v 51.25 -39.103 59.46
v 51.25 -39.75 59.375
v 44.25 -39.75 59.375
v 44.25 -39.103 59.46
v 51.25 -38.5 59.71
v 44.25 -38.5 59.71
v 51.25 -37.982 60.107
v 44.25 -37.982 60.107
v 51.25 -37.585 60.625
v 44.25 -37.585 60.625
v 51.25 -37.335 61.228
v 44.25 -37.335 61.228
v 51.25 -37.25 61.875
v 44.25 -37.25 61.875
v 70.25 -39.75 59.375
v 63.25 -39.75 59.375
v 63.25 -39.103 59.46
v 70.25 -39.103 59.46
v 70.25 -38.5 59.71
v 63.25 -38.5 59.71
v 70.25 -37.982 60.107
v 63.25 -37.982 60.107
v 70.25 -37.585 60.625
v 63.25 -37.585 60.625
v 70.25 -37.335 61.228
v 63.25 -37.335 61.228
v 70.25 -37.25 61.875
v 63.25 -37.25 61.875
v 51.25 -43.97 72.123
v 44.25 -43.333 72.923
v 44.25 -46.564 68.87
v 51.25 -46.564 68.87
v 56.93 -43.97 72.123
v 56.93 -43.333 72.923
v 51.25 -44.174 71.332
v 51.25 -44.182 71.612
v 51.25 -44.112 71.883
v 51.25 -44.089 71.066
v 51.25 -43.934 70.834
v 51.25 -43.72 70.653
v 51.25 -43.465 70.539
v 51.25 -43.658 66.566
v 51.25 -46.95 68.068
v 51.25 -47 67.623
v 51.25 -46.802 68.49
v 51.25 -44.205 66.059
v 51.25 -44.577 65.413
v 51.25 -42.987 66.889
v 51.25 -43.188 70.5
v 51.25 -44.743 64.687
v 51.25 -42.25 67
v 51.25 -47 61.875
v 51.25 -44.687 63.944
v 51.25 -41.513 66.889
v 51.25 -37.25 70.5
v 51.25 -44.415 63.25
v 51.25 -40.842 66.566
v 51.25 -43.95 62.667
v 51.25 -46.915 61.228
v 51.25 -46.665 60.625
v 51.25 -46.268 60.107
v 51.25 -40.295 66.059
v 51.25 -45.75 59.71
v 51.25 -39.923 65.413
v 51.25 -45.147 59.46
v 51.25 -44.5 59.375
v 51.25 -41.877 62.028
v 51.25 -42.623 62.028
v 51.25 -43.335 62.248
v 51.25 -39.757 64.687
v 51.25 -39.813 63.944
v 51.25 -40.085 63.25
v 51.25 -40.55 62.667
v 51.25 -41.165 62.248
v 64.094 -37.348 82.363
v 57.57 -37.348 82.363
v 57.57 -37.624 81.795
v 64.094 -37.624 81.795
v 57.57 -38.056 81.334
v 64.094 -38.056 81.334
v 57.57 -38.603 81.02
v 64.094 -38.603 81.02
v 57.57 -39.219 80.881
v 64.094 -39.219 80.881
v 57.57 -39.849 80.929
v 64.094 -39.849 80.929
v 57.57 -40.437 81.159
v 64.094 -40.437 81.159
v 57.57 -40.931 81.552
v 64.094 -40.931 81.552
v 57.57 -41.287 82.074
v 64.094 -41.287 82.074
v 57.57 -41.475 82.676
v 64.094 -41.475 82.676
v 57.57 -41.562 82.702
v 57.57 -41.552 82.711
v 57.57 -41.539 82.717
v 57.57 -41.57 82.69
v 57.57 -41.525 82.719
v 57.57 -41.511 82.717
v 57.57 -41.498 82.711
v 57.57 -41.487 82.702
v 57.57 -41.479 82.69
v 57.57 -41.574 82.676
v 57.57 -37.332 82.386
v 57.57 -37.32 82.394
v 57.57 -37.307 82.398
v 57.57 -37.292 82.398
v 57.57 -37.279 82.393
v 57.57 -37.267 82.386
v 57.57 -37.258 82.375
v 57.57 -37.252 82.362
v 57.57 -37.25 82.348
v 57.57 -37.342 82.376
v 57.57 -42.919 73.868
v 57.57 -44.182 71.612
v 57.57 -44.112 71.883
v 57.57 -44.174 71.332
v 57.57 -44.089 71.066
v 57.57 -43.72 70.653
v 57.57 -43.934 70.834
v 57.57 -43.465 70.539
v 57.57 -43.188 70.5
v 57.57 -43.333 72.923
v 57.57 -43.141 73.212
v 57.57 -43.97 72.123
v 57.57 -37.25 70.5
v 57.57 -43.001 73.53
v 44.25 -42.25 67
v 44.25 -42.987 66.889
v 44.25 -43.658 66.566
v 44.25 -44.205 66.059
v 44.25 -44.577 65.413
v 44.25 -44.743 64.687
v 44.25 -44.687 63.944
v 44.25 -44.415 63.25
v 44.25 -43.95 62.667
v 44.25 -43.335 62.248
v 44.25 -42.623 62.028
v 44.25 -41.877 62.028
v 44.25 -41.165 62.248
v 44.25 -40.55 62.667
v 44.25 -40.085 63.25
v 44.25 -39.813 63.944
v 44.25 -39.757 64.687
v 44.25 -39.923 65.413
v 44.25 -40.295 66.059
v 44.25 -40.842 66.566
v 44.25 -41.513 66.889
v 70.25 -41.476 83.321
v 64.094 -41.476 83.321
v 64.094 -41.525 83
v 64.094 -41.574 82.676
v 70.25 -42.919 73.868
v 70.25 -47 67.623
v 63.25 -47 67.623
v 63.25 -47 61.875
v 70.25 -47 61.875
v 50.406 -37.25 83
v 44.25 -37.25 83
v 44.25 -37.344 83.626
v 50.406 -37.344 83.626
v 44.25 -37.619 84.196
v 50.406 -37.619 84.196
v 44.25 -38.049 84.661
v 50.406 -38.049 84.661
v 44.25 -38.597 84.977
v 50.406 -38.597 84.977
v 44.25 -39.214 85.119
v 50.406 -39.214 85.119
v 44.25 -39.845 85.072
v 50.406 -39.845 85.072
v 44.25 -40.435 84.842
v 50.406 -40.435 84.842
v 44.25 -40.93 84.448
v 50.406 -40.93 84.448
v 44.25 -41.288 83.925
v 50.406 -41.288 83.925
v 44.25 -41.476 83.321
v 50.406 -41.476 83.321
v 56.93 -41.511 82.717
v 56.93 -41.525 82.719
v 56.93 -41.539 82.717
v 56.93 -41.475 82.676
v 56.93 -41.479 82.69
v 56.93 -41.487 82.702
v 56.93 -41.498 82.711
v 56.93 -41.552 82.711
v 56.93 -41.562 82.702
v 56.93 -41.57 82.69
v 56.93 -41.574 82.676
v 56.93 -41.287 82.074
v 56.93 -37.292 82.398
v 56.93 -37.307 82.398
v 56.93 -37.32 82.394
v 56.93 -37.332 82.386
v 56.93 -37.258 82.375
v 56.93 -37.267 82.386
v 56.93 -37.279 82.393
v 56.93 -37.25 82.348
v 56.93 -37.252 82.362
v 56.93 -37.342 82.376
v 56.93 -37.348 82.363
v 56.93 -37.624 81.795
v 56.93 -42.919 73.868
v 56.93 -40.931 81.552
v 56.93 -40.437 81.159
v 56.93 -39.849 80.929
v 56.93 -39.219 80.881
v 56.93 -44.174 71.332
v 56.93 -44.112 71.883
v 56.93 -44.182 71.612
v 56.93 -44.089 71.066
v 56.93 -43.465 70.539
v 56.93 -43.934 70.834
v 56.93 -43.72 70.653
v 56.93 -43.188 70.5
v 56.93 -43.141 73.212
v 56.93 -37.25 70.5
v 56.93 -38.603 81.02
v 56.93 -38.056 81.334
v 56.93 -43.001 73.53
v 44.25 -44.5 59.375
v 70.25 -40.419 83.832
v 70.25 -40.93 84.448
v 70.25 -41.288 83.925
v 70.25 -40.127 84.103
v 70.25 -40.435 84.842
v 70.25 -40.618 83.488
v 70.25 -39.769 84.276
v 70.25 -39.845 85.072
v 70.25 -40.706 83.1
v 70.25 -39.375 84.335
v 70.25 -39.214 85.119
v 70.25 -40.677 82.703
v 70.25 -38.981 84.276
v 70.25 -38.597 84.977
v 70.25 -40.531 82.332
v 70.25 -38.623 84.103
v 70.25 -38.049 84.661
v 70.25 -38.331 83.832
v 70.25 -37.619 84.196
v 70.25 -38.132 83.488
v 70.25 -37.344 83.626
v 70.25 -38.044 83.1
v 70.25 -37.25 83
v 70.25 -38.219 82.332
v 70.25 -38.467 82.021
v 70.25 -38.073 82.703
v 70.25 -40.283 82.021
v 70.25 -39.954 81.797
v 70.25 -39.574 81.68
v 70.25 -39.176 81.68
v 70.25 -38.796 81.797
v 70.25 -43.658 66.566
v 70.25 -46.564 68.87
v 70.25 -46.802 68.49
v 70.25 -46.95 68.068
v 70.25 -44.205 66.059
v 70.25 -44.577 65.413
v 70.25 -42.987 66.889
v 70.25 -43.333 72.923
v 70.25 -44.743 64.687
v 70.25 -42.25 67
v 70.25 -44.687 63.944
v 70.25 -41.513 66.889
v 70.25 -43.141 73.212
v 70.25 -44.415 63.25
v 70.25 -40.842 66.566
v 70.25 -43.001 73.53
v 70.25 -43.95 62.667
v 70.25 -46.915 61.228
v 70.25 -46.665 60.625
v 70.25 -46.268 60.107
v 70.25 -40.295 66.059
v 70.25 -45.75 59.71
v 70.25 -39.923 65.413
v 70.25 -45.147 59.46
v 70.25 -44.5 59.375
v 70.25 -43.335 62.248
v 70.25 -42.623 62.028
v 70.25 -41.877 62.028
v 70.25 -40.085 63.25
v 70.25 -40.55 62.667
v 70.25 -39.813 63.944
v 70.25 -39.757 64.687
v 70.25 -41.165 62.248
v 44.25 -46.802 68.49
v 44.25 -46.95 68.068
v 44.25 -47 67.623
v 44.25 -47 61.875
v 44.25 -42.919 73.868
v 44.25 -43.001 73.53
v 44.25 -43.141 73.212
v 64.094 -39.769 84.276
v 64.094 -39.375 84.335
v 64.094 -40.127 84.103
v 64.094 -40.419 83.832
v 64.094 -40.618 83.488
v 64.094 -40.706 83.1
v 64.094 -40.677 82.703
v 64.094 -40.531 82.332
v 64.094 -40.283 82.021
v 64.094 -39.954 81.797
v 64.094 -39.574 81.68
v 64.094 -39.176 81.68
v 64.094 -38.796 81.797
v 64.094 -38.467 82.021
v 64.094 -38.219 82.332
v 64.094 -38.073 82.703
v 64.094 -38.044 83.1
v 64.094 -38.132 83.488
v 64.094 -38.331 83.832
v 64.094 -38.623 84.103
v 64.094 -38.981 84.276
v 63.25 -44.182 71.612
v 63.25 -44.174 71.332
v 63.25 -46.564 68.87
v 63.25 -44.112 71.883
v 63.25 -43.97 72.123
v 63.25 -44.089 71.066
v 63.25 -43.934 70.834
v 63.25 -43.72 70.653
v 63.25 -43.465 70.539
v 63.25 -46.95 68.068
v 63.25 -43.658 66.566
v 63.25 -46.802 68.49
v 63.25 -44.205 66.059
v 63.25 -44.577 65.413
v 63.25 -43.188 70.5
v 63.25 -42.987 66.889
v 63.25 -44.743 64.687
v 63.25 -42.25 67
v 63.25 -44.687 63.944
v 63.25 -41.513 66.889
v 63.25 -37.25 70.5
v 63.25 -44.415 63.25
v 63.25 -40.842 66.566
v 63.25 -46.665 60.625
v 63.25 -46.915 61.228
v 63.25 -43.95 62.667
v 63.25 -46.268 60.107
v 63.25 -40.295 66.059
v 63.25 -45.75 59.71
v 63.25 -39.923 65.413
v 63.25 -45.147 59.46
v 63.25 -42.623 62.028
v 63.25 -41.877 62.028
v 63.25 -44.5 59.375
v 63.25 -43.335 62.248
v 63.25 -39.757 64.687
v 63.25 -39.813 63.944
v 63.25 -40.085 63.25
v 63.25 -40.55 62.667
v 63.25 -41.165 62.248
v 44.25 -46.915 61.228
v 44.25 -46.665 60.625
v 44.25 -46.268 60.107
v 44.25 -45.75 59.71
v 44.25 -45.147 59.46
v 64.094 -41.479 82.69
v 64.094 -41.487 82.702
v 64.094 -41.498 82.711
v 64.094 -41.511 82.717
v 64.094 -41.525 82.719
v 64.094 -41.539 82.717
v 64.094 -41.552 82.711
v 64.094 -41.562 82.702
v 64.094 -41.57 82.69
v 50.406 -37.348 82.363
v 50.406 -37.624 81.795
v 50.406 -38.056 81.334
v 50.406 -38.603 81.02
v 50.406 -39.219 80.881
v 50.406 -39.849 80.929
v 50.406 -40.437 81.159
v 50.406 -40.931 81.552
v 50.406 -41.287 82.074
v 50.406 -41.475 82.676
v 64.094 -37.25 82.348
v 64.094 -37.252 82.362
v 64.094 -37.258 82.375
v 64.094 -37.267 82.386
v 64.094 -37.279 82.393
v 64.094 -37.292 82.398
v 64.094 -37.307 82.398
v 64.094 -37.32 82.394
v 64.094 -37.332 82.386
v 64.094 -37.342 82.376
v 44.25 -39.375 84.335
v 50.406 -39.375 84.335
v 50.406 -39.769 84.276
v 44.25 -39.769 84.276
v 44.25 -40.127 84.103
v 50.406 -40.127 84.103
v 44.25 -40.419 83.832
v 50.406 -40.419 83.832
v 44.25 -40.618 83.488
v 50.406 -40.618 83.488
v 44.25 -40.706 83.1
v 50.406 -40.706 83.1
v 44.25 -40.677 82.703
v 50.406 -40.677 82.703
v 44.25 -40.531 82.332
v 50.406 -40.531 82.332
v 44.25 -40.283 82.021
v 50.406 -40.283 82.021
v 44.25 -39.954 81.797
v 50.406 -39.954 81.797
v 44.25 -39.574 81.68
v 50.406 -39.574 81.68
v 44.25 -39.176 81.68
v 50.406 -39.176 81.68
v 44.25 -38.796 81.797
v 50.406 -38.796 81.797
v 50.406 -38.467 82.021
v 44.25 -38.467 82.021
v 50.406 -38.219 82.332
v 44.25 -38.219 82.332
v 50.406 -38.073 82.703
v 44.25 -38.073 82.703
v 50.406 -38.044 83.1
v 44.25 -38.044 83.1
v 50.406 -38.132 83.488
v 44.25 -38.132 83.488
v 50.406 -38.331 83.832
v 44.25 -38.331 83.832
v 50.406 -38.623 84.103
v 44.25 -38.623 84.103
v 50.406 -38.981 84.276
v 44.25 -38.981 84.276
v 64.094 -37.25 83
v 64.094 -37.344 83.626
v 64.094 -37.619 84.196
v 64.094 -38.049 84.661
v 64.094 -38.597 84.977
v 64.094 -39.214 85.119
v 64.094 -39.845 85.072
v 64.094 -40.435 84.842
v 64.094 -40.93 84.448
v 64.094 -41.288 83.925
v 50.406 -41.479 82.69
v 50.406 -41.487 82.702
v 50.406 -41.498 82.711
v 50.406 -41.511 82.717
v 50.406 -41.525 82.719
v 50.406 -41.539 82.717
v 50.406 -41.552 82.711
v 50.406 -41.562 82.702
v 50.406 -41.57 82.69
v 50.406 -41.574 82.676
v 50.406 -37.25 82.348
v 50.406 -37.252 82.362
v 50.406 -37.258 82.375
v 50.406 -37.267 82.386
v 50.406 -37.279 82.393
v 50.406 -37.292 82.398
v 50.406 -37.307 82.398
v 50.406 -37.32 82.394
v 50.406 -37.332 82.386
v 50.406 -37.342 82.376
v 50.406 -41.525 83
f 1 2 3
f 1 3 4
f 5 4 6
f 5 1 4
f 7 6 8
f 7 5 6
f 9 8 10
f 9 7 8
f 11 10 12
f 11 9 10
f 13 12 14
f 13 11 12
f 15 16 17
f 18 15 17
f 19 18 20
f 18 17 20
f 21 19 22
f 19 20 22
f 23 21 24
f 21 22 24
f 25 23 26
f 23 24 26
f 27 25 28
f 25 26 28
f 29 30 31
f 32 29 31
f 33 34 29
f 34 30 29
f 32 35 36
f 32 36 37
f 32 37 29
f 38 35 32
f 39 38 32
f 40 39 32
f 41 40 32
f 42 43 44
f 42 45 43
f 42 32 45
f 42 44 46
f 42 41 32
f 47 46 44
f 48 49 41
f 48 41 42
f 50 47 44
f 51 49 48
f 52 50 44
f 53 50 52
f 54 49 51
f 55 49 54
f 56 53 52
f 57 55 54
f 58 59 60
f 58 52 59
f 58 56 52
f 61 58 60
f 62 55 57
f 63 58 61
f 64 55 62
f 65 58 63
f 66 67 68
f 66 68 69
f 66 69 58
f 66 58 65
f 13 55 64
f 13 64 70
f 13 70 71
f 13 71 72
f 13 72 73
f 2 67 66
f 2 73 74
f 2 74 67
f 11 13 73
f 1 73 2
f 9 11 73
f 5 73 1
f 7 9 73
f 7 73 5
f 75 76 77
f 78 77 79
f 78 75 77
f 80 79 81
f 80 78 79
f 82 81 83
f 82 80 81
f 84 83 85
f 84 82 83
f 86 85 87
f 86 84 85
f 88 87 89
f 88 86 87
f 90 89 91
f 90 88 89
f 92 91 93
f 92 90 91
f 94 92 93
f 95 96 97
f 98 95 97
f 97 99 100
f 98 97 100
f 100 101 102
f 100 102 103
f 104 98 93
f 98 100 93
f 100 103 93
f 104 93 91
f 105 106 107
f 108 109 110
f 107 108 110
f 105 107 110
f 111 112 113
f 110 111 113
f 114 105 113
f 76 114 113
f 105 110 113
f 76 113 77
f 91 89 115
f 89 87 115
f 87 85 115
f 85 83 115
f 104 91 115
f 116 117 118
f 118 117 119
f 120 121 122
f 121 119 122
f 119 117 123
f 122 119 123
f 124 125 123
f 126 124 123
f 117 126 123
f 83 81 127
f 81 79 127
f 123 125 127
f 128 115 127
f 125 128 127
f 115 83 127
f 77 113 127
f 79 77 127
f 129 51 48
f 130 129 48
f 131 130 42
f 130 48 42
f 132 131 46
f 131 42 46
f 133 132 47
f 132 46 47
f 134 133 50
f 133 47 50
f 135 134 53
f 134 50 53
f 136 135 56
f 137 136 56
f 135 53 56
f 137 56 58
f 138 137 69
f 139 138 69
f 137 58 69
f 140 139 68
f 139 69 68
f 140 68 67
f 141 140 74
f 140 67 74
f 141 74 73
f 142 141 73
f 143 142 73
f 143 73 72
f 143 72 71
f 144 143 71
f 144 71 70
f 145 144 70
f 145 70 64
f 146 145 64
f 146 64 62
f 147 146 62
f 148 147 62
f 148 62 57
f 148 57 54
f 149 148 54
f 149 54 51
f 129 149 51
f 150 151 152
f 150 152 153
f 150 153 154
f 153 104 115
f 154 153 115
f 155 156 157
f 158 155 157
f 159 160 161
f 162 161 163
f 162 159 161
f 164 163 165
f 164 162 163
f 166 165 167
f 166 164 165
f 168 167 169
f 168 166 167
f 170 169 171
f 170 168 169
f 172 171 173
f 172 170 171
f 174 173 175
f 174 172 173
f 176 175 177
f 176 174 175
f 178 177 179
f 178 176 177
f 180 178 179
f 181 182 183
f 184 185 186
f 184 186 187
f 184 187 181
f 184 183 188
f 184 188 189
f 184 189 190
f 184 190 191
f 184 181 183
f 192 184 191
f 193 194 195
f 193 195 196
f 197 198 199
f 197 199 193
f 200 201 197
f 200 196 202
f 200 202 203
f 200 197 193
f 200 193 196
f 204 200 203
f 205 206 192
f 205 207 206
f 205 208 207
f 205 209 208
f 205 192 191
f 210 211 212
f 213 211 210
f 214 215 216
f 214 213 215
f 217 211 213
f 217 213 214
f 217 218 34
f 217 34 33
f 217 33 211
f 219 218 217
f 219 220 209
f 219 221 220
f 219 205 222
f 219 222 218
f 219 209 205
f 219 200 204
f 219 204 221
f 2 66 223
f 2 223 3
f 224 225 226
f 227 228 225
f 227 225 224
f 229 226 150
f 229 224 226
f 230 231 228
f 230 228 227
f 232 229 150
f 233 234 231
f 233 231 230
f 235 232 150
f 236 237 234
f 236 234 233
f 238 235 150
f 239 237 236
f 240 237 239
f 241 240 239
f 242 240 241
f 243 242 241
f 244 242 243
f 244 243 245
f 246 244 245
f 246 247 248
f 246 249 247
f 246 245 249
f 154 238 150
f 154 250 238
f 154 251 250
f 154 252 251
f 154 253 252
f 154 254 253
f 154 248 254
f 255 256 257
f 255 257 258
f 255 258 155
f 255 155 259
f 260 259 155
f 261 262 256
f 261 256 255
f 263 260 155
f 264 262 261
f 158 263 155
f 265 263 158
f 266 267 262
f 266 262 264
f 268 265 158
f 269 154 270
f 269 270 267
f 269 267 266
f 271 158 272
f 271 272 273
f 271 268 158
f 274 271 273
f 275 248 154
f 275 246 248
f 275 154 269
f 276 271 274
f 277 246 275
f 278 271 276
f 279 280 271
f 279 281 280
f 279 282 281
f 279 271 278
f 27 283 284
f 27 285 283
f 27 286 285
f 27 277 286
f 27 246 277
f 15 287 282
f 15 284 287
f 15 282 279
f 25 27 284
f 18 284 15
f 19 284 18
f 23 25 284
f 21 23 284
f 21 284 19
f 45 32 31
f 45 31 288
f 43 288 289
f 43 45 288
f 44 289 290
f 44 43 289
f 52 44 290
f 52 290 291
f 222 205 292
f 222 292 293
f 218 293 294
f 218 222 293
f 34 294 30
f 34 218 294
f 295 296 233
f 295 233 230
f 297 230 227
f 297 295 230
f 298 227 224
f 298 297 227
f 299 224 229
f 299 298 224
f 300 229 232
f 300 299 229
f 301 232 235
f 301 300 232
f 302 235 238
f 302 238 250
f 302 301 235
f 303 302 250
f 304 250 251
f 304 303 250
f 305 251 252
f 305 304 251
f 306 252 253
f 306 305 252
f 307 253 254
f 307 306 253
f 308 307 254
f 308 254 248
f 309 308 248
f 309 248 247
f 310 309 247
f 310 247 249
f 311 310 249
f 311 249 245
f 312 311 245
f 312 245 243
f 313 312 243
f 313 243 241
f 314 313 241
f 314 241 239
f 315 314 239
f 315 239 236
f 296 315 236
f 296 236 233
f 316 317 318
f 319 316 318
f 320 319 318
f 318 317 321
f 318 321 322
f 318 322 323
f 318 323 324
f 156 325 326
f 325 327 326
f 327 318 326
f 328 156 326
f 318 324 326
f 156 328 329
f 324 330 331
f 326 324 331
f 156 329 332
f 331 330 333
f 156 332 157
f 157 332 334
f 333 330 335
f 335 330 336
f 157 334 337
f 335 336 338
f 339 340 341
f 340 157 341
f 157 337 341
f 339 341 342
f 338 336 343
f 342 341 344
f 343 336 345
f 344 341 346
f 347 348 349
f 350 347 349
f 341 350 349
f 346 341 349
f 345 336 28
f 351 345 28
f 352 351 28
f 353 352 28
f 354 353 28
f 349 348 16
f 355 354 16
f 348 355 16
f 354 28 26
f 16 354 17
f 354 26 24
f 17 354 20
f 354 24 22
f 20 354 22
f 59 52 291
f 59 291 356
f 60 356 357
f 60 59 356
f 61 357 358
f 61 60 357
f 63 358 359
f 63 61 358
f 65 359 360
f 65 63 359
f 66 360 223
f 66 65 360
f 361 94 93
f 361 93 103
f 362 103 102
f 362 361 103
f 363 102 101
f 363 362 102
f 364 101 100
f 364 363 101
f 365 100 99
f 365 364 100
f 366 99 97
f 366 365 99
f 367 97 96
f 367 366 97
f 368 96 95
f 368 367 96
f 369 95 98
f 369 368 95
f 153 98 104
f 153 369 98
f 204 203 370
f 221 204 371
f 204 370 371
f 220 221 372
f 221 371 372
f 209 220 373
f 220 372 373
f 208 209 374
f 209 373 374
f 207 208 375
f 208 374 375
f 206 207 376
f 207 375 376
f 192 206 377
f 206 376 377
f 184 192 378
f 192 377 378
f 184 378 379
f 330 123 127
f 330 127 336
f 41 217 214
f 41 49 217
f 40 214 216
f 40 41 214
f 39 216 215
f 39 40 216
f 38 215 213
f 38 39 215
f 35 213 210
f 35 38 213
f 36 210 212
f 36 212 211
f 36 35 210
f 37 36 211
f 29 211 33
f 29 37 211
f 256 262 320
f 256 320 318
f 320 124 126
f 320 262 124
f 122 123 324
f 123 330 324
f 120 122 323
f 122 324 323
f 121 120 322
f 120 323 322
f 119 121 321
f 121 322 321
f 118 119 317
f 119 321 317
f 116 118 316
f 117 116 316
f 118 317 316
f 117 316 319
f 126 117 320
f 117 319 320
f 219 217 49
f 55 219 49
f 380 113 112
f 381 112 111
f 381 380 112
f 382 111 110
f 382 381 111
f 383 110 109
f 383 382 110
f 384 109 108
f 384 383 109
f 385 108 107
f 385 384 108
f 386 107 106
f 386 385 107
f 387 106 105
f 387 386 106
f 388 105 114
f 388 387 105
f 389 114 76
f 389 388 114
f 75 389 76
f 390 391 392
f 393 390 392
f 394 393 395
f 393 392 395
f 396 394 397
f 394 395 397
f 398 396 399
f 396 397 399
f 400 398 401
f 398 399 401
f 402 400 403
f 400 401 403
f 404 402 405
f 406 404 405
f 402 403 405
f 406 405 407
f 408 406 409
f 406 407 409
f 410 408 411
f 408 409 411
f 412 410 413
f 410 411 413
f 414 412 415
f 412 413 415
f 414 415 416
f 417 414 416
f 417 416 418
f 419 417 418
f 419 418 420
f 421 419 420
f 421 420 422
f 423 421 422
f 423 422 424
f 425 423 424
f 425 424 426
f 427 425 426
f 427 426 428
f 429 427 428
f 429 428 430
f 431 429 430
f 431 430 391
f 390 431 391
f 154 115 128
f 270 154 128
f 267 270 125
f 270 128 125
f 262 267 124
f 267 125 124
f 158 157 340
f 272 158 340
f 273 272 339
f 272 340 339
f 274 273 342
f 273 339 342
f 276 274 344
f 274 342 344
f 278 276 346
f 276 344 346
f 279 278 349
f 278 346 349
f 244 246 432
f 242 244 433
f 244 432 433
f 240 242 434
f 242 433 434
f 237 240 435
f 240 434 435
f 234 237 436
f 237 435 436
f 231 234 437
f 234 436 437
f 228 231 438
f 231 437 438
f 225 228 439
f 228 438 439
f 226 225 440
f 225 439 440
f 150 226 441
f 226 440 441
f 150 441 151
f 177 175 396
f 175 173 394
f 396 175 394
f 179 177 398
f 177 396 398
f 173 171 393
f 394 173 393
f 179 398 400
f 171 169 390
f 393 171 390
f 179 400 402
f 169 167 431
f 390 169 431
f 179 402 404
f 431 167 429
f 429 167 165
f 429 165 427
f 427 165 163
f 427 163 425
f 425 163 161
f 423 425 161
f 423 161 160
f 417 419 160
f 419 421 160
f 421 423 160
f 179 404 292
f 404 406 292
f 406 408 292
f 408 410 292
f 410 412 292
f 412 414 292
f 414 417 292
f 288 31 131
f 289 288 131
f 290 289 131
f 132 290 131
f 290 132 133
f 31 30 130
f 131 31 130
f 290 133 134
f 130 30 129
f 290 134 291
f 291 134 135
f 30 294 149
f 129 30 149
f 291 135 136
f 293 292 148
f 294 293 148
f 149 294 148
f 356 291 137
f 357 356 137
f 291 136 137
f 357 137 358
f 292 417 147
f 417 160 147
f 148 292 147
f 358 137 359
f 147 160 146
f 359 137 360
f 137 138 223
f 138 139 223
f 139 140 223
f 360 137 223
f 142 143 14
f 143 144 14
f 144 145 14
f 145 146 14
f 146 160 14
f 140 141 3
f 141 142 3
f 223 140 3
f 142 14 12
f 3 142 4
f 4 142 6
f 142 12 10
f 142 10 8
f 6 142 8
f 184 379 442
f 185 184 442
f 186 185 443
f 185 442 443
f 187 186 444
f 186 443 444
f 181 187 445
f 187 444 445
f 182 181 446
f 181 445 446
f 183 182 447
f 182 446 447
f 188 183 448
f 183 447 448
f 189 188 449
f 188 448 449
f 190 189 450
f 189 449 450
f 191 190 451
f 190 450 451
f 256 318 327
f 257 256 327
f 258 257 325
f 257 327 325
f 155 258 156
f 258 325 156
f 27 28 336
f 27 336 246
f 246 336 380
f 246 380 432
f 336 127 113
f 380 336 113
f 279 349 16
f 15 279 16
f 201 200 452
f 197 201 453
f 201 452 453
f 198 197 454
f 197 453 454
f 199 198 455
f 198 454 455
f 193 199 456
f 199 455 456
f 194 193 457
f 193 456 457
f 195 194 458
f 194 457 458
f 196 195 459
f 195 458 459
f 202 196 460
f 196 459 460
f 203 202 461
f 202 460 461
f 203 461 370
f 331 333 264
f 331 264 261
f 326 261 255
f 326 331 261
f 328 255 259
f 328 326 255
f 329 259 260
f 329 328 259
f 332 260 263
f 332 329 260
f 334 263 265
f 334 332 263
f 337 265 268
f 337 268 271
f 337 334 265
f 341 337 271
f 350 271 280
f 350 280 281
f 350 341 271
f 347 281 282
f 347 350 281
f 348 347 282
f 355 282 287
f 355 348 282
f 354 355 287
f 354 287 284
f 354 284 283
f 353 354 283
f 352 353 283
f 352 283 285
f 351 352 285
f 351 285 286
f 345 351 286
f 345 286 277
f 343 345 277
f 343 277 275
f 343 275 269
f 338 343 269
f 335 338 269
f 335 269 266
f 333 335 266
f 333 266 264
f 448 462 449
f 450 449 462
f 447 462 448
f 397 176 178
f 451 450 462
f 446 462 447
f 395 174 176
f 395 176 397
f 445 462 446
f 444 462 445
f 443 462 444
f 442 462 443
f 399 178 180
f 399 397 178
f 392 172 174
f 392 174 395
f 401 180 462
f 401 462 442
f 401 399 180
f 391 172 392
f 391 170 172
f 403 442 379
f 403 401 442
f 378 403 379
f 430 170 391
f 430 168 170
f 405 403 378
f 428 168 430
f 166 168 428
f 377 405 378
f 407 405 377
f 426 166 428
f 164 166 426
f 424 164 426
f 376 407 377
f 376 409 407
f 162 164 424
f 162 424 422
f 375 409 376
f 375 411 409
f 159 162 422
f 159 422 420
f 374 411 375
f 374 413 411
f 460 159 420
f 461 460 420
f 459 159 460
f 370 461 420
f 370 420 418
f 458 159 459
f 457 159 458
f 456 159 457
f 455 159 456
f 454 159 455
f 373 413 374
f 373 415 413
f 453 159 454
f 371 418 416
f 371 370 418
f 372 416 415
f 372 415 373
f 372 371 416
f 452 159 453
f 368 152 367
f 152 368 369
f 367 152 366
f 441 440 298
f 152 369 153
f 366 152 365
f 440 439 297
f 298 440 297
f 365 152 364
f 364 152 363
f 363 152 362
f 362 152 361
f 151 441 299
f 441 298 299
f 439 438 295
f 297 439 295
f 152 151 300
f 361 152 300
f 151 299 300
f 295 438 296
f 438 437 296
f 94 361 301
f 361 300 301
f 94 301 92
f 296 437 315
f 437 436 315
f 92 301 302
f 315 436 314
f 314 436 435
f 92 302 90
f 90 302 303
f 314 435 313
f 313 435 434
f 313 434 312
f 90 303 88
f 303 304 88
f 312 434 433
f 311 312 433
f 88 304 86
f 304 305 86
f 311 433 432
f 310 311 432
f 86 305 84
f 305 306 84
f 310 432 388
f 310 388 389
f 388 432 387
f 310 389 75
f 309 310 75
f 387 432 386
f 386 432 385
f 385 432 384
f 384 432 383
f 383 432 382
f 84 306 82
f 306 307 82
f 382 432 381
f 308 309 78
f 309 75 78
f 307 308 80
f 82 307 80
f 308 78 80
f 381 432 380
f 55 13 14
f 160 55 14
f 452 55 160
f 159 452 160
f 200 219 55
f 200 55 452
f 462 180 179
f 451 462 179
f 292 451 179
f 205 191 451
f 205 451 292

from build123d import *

# Parameters (mm, degrees)
SKETCH_1_R          = 2.5
SKETCH_1_R_2        = 2.125
SKETCH_1_R_3        = 1.335133797
EXTRUDE_1_DEPTH     = 13
SKETCH_2_W          = 6.524253829
SKETCH_2_H          = 2.585648983
CUT_EXTRUDE_2_DEPTH = 120.959693752
CUT_EXTRUDE_3_DEPTH = 98.45681871
CUT_EXTRUDE_4_DEPTH = 98.45681871
FILLET_1_R          = 1


with BuildPart() as part:
    # 草图1 → 凸台-拉伸1 (new body)
    # profile 1 of 2: a face of its own
    with BuildSketch(Plane(origin=(57.25, 0, 0), x_dir=(0, 0, -1), z_dir=(1, 0, 0))):
        with BuildLine():
            Line((-61.875, -37.25), (-68.322437436, -37.25))
            Line((-68.322437436, -37.25), (-83, -37.25))
            ThreePointArc((-83, -37.25), (-81.49739809, -37.87239809), (-80.875, -39.375))
            ThreePointArc((-80.875, -39.375), (-81.615466865, -40.987046214), (-83.320828703, -41.475641317))
            Line((-83.320828703, -41.475641317), (-73.867519615, -42.91943511))
            ThreePointArc((-73.867519615, -42.91943511), (-73.3680524, -43.064100999), (-72.922760566, -43.332635727))
            Line((-72.922760566, -43.332635727), (-68.869512223, -46.563873564))
            ThreePointArc((-68.869512223, -46.563873564), (-68.283195443, -46.88782244), (-67.622796748, -47))
            Line((-67.622796748, -47), (-61.875, -47))
            ThreePointArc((-61.875, -47), (-60.107233047, -46.267766953), (-59.375, -44.5))
            Line((-59.375, -44.5), (-59.375, -39.75))
            ThreePointArc((-59.375, -39.75), (-60.107233047, -37.982233047), (-61.875, -37.25))
        make_face()
        with Locations(Location((-64.5, -42.25, 0), (0, 0, 180))):
            Circle(SKETCH_1_R, mode=Mode.SUBTRACT)
    # profile 2 of 2: a face of its own
    with BuildSketch(Plane(origin=(57.25, 0, 0), x_dir=(0, 0, -1), z_dir=(1, 0, 0))):
        with Locations((-83, -39.375)):
            Circle(SKETCH_1_R_2)
        with Locations(Location((-83, -39.375, 0), (0, 0, 180))):
            Circle(SKETCH_1_R_3, mode=Mode.SUBTRACT)
    extrude(amount=EXTRUDE_1_DEPTH)

    # 草图2 → 切除-拉伸2 (cut, through all)
    with BuildSketch(Plane(origin=(0, 0, 0), x_dir=(1, 0, 0), z_dir=(0, 1, 0))):
        Polygon((57.569510981, -70.5), (63.25, -70.5), (63.25, -57.795794402), (56.681632837, -57.795794402), (56.681632837, -70.222083514), (57.569510981, -70.222083514), align=None)
        Polygon((57.569510981, -83), (57.569510981, -70.5), (56.681632837, -70.5), (56.681632837, -83), (57.25, -83), align=None)
        with Locations((60.831637896, -84.292824491)):
            Rectangle(SKETCH_2_W, SKETCH_2_H)
        Polygon((57.569510981, -85.585648983), (57.569510981, -83), (57.25, -83), (56.681632837, -83), (56.681632837, -85.585648983), align=None)
    extrude(amount=-CUT_EXTRUDE_2_DEPTH, mode=Mode.SUBTRACT)


with BuildPart() as cut_extrude_2_kept_piece:
    # of the separate pieces the step leaves, the one the design keeps (cut_extrude_2_pieces_kept)
    add(part.part.solids().sort_by_distance((63.25, -37.25, 61.875))[0])

    # 草图3 → 切除-拉伸3 (cut, through all)
    with BuildSketch(Plane.ZY.offset(-64.09376481)):
        with BuildLine():
            ThreePointArc((85.125, -39.375), (84.50260191, -37.87239809), (83, -37.25))
            Line((83, -37.25), (83, -38.039866203))
            ThreePointArc((83, -38.039866203), (84.335133797, -39.375), (83, -40.710133797))
            Line((83, -40.710133797), (83, -41.5))
            ThreePointArc((83, -41.5), (83.160876041, -41.493901579), (83.320828703, -41.475641317))
            ThreePointArc((83.320828703, -41.475641317), (84.612046214, -40.759533135), (85.125, -39.375))
        make_face()
        with BuildLine():
            Line((83, -38.039866203), (83, -37.25))
            ThreePointArc((83, -37.25), (80.875, -39.375), (83, -41.5))
            Line((83, -41.5), (83, -40.710133797))
            ThreePointArc((83, -40.710133797), (84.335133797, -39.375), (83, -38.039866203))
        make_face()
        with BuildLine():
            ThreePointArc((85.125, -39.375), (84.50260191, -37.87239809), (83, -37.25))
            Line((83, -37.25), (83, -38.039866203))
            ThreePointArc((83, -38.039866203), (84.335133797, -39.375), (83, -40.710133797))
            Line((83, -40.710133797), (83, -41.5))
            ThreePointArc((83, -41.5), (83.160876041, -41.493901579), (83.320828703, -41.475641317))
            ThreePointArc((83.320828703, -41.475641317), (84.612046214, -40.759533135), (85.125, -39.375))
        make_face()
    extrude(amount=CUT_EXTRUDE_3_DEPTH, mode=Mode.SUBTRACT)

    # 草图4 → 切除-拉伸4 (cut, through all)
    with BuildSketch(Plane.ZY.offset(-64.09376481)):
        with BuildLine():
            Line((83, -37.25), (82.348079759, -37.25))
            ThreePointArc((82.348079759, -37.25), (82.397501705, -37.29241902), (82.363066432, -37.347701149))
            ThreePointArc((82.363066432, -37.347701149), (82.677808331, -37.2745673), (83, -37.25))
        make_face()
        with BuildLine():
            ThreePointArc((83, -41.5), (82.837749118, -41.493796746), (82.676445515, -41.475223201))
            ThreePointArc((82.676445515, -41.475223201), (82.718832444, -41.524672669), (82.676381359, -41.574067071))
            Line((82.676381359, -41.574067071), (83, -41.524641142))
            Line((83, -41.524641142), (83, -41.5))
        make_face()
    extrude(amount=CUT_EXTRUDE_4_DEPTH, mode=Mode.SUBTRACT)

    # 圆角1
    fillet_1_edges = [cut_extrude_2_kept_piece.edges().sort_by_distance(p)[0] for p in [
        (60.409755491, -45.264053432, 70.5),
    ]]
    fillet(fillet_1_edges, radius=FILLET_1_R)


with BuildPart() as body_2:
    # 镜向2: mirrored copy
    add(cut_extrude_2_kept_piece.part.mirror(Plane(origin=(57.25, 0, 0), x_dir=(0, 0, 1), z_dir=(1, 0, 0))))


with BuildPart() as body_2_2:
    # 镜向3: mirrored copy
    add(cut_extrude_2_kept_piece.part.mirror(Plane(origin=(57.25, 0, 0), x_dir=(0, 0, 1), z_dir=(1, 0, 0))))


solid = Compound([cut_extrude_2_kept_piece.part, body_2_2.part])
